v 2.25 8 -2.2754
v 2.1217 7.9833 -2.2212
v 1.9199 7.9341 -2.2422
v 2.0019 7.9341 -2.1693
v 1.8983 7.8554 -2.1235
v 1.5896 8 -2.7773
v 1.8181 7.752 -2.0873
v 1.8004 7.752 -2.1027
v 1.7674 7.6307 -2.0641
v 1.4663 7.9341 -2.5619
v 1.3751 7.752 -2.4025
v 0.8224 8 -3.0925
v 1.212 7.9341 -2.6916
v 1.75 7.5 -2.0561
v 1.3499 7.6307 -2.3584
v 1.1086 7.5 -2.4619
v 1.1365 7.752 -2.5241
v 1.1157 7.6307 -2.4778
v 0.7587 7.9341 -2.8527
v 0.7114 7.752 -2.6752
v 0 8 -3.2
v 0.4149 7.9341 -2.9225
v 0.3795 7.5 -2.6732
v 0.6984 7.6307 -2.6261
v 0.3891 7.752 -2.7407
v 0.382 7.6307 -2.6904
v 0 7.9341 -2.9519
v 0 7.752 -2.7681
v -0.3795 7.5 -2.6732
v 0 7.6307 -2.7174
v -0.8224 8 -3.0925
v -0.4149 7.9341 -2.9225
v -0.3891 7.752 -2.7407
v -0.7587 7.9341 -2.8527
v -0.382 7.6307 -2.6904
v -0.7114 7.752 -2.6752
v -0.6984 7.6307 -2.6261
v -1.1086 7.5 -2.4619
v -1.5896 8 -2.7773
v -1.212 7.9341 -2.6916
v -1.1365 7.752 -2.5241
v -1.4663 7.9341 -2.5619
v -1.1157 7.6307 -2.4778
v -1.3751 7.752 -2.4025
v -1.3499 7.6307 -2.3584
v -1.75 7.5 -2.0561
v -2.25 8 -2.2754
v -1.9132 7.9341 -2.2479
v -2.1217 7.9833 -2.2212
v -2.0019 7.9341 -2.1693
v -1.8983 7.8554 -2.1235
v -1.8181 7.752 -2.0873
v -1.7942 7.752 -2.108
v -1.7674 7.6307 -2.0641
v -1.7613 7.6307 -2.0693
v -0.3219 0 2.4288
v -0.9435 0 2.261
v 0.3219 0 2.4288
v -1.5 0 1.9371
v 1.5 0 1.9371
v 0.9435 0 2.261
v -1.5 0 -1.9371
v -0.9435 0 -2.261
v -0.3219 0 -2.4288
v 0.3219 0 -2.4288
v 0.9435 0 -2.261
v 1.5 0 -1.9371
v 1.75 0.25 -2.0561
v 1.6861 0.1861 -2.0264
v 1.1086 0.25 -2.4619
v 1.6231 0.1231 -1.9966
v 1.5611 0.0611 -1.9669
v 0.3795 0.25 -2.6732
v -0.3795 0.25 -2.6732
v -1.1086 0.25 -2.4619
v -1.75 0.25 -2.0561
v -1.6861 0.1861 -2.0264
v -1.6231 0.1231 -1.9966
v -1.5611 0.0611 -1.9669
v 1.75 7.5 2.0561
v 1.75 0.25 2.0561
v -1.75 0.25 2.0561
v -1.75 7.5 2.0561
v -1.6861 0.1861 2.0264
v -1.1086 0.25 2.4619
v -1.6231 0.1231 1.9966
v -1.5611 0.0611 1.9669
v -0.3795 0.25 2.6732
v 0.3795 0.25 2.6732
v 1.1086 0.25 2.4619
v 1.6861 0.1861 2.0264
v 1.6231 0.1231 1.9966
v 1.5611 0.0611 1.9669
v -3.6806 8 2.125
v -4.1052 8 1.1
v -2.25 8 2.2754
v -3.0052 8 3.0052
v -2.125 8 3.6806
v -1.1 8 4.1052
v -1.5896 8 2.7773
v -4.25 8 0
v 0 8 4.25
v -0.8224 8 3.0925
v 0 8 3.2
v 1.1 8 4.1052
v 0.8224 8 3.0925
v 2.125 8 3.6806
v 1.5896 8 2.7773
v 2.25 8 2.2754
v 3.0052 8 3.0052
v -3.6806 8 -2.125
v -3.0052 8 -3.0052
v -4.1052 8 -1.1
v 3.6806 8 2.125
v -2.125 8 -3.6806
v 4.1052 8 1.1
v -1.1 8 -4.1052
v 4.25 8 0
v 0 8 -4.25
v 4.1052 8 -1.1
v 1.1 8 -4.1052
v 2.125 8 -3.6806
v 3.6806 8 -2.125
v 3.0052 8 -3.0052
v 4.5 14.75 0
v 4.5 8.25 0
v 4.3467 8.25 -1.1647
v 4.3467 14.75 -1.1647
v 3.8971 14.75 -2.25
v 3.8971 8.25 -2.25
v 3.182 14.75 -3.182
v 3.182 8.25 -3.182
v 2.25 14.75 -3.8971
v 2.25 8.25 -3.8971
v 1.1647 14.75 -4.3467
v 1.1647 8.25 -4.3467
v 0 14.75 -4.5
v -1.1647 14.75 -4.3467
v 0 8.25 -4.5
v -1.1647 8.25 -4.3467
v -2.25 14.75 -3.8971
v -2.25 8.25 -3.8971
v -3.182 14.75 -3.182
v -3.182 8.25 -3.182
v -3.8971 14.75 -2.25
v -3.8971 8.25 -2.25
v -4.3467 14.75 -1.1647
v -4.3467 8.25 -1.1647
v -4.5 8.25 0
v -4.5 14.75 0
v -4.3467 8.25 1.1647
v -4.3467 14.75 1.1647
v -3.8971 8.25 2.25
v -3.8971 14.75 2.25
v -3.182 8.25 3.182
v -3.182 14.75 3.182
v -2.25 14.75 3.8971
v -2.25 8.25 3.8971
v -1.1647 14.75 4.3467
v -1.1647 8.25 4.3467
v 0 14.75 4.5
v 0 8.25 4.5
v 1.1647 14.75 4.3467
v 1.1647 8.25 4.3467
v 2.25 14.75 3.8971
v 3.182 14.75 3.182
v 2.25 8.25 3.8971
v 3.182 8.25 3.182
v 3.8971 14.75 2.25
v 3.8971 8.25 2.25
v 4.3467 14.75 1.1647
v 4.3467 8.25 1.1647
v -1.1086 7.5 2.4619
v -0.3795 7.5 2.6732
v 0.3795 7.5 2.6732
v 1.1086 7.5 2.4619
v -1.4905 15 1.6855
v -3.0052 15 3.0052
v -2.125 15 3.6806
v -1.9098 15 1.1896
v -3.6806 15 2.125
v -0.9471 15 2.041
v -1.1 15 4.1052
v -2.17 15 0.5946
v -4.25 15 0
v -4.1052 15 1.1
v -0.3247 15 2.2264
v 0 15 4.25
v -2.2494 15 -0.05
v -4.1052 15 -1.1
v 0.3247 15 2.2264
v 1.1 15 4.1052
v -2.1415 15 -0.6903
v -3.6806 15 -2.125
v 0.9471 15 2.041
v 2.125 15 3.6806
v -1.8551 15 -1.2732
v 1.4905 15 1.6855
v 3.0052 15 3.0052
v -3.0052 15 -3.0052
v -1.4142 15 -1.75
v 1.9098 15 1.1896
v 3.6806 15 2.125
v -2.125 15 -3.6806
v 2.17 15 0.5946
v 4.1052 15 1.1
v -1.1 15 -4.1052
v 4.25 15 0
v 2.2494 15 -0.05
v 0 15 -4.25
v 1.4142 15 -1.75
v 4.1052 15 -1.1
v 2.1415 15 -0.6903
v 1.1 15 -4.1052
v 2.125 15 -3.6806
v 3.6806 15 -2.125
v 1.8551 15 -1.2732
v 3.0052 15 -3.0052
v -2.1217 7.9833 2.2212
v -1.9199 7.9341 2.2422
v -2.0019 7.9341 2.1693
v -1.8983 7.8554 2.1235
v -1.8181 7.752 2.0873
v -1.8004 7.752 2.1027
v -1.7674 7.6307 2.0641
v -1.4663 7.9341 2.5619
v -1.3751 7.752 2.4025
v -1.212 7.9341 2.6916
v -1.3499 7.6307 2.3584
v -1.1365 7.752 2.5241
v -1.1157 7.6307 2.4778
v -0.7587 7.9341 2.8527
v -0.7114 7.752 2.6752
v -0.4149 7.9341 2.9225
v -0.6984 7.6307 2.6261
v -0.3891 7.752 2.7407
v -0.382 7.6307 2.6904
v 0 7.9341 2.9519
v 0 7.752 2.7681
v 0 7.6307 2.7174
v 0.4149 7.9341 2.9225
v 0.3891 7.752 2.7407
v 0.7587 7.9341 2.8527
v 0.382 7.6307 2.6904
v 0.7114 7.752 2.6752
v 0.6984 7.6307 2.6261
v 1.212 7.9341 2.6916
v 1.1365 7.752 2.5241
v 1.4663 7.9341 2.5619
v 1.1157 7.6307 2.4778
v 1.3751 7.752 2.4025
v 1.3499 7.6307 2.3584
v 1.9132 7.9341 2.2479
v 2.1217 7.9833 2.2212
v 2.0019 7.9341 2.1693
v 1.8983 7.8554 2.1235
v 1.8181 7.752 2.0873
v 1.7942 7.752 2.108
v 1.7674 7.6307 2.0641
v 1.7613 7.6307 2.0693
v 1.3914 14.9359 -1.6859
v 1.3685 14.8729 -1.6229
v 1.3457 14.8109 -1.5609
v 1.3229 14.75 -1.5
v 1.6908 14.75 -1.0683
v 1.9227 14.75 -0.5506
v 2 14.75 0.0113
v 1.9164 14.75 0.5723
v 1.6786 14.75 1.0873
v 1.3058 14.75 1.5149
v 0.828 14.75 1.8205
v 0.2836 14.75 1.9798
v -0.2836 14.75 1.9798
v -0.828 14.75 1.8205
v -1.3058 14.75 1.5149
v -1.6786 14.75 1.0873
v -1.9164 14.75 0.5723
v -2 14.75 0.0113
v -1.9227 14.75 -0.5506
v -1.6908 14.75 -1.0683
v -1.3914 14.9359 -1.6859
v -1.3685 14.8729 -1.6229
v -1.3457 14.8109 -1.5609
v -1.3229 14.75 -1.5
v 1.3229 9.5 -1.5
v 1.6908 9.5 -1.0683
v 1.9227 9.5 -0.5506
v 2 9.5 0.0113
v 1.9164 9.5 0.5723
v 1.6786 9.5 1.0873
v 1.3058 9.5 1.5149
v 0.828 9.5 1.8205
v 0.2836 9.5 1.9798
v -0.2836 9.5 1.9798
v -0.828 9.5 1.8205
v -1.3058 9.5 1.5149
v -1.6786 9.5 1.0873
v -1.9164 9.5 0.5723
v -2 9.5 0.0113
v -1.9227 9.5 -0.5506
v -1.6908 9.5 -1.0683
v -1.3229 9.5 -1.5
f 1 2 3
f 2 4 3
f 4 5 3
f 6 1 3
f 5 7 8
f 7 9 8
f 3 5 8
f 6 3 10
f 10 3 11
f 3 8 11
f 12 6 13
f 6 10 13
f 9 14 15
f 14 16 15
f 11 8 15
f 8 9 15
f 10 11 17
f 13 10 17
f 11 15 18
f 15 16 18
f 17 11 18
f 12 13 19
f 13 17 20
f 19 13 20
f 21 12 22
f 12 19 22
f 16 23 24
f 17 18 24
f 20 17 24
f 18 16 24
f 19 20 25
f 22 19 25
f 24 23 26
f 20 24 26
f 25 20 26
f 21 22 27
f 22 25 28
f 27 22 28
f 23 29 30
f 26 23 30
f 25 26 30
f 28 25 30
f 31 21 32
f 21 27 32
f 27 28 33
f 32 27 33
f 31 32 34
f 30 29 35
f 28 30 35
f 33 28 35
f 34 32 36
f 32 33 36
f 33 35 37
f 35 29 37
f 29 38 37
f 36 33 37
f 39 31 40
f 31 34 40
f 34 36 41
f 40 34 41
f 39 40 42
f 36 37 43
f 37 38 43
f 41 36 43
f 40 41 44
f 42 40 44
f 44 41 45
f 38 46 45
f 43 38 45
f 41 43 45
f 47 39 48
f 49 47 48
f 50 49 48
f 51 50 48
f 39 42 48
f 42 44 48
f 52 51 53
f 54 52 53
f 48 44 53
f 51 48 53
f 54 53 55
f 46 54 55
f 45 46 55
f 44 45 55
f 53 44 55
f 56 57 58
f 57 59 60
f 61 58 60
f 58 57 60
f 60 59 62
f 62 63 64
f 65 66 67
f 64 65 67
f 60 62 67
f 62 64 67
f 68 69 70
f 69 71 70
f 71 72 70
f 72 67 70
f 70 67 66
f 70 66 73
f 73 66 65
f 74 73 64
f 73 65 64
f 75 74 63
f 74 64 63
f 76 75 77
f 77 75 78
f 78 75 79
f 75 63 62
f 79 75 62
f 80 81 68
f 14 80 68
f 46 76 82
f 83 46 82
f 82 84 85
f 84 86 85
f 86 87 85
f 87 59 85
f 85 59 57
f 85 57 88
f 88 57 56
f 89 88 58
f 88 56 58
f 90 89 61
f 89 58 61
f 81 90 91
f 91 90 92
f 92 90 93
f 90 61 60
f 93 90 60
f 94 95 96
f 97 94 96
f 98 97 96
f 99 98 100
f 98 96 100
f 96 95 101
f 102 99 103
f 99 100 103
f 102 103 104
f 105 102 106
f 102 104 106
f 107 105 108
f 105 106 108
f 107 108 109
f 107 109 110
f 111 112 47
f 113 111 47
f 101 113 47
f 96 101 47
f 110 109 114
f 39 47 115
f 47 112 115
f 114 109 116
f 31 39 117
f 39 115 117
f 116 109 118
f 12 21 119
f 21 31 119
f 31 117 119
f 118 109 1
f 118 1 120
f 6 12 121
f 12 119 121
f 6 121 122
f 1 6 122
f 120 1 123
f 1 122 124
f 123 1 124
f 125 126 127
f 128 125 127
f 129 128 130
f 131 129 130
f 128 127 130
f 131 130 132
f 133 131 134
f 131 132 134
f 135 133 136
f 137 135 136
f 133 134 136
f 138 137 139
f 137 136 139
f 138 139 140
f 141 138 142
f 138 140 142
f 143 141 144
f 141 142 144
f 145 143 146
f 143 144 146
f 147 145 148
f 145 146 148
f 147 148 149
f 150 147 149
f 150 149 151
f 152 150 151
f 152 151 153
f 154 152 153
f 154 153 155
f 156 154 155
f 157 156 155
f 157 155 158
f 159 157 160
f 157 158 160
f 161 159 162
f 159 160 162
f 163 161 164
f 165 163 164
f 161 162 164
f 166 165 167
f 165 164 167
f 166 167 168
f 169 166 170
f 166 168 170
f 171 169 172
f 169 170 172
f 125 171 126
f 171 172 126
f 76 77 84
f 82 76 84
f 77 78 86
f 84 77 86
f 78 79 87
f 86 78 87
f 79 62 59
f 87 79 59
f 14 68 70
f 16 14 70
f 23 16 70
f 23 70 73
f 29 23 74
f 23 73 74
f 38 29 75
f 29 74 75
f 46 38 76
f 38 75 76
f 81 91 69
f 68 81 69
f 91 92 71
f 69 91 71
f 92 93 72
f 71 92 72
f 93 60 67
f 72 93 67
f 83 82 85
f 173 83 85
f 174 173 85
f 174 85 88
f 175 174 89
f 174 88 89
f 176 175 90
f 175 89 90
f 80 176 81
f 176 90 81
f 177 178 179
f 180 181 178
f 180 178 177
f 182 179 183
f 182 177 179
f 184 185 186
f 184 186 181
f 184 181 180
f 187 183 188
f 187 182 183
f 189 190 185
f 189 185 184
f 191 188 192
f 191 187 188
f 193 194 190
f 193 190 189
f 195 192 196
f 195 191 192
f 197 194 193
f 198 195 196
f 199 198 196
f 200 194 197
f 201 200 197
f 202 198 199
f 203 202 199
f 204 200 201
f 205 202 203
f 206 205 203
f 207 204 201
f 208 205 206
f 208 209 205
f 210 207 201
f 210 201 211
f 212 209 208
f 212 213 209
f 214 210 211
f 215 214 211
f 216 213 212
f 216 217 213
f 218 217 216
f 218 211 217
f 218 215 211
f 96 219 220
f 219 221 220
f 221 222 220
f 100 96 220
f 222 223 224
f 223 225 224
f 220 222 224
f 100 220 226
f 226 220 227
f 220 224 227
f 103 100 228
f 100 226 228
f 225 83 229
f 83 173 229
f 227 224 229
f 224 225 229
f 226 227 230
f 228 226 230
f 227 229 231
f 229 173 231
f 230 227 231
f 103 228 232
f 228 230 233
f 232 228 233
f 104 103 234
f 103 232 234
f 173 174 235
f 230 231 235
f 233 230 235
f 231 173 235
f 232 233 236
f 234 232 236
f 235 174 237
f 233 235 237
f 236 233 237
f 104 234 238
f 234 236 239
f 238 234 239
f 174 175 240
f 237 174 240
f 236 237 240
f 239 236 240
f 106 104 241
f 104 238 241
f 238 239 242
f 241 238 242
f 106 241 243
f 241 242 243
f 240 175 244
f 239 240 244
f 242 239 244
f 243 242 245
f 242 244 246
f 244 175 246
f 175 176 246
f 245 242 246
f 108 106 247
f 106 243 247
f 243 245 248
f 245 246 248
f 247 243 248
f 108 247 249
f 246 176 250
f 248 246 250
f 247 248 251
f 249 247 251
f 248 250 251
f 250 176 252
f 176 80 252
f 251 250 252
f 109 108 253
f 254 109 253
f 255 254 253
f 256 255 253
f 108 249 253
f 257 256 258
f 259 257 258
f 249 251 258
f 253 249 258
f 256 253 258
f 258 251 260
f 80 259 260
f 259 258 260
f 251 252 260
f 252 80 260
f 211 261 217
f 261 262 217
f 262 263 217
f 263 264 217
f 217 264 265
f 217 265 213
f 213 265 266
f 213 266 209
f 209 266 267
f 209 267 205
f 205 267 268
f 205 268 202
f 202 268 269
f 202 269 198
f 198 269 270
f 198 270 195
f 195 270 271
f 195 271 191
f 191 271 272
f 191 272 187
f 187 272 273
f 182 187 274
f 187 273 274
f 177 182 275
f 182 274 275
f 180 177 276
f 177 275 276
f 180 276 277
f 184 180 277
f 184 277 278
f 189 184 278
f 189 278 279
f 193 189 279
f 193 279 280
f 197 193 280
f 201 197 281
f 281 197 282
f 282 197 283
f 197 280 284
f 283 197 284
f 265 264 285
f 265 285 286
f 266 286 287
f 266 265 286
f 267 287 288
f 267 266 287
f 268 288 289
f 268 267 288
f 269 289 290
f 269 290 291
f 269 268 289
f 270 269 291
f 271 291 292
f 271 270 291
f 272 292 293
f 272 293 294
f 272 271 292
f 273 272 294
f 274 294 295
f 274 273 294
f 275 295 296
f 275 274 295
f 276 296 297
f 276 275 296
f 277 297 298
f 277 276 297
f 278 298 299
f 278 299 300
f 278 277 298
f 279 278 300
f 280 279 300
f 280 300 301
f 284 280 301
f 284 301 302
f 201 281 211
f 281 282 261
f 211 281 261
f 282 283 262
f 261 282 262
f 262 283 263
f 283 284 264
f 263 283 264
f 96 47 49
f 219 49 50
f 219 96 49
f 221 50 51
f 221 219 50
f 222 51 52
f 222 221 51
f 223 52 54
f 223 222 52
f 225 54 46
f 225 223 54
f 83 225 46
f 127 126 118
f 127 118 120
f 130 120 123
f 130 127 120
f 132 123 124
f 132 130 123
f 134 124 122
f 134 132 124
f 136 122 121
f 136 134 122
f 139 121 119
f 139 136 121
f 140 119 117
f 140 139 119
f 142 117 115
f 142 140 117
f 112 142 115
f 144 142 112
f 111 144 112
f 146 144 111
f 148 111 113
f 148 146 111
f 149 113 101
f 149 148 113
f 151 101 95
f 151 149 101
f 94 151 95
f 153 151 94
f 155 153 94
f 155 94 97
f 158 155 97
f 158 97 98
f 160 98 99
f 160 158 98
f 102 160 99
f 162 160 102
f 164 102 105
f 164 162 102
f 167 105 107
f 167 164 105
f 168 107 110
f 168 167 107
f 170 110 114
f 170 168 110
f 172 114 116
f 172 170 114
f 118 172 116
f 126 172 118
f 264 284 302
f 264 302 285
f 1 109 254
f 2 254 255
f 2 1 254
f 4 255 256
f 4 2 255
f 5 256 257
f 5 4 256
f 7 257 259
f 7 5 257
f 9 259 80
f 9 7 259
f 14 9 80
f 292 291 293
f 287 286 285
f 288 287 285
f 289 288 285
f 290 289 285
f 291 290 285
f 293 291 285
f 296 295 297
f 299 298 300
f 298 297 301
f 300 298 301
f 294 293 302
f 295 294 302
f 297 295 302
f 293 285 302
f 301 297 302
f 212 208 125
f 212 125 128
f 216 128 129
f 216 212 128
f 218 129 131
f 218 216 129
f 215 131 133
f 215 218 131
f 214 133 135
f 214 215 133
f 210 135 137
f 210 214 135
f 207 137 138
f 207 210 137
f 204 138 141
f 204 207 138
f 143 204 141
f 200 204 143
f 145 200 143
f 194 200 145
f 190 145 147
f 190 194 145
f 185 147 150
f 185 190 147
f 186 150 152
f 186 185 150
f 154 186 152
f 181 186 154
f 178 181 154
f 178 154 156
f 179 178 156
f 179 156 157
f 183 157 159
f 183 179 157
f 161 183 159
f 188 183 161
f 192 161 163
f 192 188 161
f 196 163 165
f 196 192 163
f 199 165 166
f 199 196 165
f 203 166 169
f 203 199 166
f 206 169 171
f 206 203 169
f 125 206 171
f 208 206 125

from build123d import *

# Parameters (mm, degrees)
BOSS_EXTRUDE1_DEPTH = 8
SKETCH2_R           = 4.5
BOSS_EXTRUDE2_DEPTH = 7
CUT_EXTRUDE1_DEPTH  = 5.5
FILLET1_R           = 0.5
CHAMFER1_SIZE       = 0.25


with BuildPart() as part:
    # Sketch1 → Boss-Extrude1 (new body)
    with BuildSketch(Plane(origin=(0, 0, 0), x_dir=(1, 0, 0), z_dir=(0, 1, 0))):
        with BuildLine():
            Line((-1.75, 2.056088519), (-1.75, -2.056088519))
            ThreePointArc((-1.75, -2.056088519), (0, -2.7), (1.75, -2.056088519))
            Line((1.75, -2.056088519), (1.75, 2.056088519))
            ThreePointArc((1.75, 2.056088519), (0, 2.7), (-1.75, 2.056088519))
        make_face()
    extrude(amount=BOSS_EXTRUDE1_DEPTH)

    # Sketch2 → Boss-Extrude2 (add)
    with BuildSketch(Plane(origin=(0, 8, 0), x_dir=(1, 0, 0), z_dir=(0, 1, 0))):
        Circle(SKETCH2_R)
    extrude(amount=BOSS_EXTRUDE2_DEPTH)

    # Sketch3 → Cut-Extrude1 (cut)
    with BuildSketch(Plane(origin=(0, 15, 0), x_dir=(1, 0, 0), z_dir=(0, 1, 0))):
        with BuildLine():
            Line((-1.322875656, 1.5), (1.322875656, 1.5))
            ThreePointArc((1.322875656, 1.5), (0, -2), (-1.322875656, 1.5))
        make_face()
    extrude(amount=-CUT_EXTRUDE1_DEPTH, mode=Mode.SUBTRACT)

    # Fillet1
    fillet1_edges = [part.edges().sort_by_distance(p)[0] for p in [
        (0, 8, 2.7),
        (1.75, 8, 0),
        (0, 8, -2.7),
        (-1.75, 8, 0),
    ]]
    fillet(fillet1_edges, radius=FILLET1_R)

    # Chamfer1
    chamfer1_edges = [part.edges().sort_by_distance(p)[0] for p in [
        (-4.5, 8, 0),
        (-4.5, 15, 0),
        (0, 15, 2),
        (0, 15, -1.5),
        (1.75, 0, 0),
        (0, 0, 2.7),
        (-1.75, 0, 0),
        (0, 0, -2.7),
    ]]
    chamfer(chamfer1_edges, length=CHAMFER1_SIZE)


solid = part.part
